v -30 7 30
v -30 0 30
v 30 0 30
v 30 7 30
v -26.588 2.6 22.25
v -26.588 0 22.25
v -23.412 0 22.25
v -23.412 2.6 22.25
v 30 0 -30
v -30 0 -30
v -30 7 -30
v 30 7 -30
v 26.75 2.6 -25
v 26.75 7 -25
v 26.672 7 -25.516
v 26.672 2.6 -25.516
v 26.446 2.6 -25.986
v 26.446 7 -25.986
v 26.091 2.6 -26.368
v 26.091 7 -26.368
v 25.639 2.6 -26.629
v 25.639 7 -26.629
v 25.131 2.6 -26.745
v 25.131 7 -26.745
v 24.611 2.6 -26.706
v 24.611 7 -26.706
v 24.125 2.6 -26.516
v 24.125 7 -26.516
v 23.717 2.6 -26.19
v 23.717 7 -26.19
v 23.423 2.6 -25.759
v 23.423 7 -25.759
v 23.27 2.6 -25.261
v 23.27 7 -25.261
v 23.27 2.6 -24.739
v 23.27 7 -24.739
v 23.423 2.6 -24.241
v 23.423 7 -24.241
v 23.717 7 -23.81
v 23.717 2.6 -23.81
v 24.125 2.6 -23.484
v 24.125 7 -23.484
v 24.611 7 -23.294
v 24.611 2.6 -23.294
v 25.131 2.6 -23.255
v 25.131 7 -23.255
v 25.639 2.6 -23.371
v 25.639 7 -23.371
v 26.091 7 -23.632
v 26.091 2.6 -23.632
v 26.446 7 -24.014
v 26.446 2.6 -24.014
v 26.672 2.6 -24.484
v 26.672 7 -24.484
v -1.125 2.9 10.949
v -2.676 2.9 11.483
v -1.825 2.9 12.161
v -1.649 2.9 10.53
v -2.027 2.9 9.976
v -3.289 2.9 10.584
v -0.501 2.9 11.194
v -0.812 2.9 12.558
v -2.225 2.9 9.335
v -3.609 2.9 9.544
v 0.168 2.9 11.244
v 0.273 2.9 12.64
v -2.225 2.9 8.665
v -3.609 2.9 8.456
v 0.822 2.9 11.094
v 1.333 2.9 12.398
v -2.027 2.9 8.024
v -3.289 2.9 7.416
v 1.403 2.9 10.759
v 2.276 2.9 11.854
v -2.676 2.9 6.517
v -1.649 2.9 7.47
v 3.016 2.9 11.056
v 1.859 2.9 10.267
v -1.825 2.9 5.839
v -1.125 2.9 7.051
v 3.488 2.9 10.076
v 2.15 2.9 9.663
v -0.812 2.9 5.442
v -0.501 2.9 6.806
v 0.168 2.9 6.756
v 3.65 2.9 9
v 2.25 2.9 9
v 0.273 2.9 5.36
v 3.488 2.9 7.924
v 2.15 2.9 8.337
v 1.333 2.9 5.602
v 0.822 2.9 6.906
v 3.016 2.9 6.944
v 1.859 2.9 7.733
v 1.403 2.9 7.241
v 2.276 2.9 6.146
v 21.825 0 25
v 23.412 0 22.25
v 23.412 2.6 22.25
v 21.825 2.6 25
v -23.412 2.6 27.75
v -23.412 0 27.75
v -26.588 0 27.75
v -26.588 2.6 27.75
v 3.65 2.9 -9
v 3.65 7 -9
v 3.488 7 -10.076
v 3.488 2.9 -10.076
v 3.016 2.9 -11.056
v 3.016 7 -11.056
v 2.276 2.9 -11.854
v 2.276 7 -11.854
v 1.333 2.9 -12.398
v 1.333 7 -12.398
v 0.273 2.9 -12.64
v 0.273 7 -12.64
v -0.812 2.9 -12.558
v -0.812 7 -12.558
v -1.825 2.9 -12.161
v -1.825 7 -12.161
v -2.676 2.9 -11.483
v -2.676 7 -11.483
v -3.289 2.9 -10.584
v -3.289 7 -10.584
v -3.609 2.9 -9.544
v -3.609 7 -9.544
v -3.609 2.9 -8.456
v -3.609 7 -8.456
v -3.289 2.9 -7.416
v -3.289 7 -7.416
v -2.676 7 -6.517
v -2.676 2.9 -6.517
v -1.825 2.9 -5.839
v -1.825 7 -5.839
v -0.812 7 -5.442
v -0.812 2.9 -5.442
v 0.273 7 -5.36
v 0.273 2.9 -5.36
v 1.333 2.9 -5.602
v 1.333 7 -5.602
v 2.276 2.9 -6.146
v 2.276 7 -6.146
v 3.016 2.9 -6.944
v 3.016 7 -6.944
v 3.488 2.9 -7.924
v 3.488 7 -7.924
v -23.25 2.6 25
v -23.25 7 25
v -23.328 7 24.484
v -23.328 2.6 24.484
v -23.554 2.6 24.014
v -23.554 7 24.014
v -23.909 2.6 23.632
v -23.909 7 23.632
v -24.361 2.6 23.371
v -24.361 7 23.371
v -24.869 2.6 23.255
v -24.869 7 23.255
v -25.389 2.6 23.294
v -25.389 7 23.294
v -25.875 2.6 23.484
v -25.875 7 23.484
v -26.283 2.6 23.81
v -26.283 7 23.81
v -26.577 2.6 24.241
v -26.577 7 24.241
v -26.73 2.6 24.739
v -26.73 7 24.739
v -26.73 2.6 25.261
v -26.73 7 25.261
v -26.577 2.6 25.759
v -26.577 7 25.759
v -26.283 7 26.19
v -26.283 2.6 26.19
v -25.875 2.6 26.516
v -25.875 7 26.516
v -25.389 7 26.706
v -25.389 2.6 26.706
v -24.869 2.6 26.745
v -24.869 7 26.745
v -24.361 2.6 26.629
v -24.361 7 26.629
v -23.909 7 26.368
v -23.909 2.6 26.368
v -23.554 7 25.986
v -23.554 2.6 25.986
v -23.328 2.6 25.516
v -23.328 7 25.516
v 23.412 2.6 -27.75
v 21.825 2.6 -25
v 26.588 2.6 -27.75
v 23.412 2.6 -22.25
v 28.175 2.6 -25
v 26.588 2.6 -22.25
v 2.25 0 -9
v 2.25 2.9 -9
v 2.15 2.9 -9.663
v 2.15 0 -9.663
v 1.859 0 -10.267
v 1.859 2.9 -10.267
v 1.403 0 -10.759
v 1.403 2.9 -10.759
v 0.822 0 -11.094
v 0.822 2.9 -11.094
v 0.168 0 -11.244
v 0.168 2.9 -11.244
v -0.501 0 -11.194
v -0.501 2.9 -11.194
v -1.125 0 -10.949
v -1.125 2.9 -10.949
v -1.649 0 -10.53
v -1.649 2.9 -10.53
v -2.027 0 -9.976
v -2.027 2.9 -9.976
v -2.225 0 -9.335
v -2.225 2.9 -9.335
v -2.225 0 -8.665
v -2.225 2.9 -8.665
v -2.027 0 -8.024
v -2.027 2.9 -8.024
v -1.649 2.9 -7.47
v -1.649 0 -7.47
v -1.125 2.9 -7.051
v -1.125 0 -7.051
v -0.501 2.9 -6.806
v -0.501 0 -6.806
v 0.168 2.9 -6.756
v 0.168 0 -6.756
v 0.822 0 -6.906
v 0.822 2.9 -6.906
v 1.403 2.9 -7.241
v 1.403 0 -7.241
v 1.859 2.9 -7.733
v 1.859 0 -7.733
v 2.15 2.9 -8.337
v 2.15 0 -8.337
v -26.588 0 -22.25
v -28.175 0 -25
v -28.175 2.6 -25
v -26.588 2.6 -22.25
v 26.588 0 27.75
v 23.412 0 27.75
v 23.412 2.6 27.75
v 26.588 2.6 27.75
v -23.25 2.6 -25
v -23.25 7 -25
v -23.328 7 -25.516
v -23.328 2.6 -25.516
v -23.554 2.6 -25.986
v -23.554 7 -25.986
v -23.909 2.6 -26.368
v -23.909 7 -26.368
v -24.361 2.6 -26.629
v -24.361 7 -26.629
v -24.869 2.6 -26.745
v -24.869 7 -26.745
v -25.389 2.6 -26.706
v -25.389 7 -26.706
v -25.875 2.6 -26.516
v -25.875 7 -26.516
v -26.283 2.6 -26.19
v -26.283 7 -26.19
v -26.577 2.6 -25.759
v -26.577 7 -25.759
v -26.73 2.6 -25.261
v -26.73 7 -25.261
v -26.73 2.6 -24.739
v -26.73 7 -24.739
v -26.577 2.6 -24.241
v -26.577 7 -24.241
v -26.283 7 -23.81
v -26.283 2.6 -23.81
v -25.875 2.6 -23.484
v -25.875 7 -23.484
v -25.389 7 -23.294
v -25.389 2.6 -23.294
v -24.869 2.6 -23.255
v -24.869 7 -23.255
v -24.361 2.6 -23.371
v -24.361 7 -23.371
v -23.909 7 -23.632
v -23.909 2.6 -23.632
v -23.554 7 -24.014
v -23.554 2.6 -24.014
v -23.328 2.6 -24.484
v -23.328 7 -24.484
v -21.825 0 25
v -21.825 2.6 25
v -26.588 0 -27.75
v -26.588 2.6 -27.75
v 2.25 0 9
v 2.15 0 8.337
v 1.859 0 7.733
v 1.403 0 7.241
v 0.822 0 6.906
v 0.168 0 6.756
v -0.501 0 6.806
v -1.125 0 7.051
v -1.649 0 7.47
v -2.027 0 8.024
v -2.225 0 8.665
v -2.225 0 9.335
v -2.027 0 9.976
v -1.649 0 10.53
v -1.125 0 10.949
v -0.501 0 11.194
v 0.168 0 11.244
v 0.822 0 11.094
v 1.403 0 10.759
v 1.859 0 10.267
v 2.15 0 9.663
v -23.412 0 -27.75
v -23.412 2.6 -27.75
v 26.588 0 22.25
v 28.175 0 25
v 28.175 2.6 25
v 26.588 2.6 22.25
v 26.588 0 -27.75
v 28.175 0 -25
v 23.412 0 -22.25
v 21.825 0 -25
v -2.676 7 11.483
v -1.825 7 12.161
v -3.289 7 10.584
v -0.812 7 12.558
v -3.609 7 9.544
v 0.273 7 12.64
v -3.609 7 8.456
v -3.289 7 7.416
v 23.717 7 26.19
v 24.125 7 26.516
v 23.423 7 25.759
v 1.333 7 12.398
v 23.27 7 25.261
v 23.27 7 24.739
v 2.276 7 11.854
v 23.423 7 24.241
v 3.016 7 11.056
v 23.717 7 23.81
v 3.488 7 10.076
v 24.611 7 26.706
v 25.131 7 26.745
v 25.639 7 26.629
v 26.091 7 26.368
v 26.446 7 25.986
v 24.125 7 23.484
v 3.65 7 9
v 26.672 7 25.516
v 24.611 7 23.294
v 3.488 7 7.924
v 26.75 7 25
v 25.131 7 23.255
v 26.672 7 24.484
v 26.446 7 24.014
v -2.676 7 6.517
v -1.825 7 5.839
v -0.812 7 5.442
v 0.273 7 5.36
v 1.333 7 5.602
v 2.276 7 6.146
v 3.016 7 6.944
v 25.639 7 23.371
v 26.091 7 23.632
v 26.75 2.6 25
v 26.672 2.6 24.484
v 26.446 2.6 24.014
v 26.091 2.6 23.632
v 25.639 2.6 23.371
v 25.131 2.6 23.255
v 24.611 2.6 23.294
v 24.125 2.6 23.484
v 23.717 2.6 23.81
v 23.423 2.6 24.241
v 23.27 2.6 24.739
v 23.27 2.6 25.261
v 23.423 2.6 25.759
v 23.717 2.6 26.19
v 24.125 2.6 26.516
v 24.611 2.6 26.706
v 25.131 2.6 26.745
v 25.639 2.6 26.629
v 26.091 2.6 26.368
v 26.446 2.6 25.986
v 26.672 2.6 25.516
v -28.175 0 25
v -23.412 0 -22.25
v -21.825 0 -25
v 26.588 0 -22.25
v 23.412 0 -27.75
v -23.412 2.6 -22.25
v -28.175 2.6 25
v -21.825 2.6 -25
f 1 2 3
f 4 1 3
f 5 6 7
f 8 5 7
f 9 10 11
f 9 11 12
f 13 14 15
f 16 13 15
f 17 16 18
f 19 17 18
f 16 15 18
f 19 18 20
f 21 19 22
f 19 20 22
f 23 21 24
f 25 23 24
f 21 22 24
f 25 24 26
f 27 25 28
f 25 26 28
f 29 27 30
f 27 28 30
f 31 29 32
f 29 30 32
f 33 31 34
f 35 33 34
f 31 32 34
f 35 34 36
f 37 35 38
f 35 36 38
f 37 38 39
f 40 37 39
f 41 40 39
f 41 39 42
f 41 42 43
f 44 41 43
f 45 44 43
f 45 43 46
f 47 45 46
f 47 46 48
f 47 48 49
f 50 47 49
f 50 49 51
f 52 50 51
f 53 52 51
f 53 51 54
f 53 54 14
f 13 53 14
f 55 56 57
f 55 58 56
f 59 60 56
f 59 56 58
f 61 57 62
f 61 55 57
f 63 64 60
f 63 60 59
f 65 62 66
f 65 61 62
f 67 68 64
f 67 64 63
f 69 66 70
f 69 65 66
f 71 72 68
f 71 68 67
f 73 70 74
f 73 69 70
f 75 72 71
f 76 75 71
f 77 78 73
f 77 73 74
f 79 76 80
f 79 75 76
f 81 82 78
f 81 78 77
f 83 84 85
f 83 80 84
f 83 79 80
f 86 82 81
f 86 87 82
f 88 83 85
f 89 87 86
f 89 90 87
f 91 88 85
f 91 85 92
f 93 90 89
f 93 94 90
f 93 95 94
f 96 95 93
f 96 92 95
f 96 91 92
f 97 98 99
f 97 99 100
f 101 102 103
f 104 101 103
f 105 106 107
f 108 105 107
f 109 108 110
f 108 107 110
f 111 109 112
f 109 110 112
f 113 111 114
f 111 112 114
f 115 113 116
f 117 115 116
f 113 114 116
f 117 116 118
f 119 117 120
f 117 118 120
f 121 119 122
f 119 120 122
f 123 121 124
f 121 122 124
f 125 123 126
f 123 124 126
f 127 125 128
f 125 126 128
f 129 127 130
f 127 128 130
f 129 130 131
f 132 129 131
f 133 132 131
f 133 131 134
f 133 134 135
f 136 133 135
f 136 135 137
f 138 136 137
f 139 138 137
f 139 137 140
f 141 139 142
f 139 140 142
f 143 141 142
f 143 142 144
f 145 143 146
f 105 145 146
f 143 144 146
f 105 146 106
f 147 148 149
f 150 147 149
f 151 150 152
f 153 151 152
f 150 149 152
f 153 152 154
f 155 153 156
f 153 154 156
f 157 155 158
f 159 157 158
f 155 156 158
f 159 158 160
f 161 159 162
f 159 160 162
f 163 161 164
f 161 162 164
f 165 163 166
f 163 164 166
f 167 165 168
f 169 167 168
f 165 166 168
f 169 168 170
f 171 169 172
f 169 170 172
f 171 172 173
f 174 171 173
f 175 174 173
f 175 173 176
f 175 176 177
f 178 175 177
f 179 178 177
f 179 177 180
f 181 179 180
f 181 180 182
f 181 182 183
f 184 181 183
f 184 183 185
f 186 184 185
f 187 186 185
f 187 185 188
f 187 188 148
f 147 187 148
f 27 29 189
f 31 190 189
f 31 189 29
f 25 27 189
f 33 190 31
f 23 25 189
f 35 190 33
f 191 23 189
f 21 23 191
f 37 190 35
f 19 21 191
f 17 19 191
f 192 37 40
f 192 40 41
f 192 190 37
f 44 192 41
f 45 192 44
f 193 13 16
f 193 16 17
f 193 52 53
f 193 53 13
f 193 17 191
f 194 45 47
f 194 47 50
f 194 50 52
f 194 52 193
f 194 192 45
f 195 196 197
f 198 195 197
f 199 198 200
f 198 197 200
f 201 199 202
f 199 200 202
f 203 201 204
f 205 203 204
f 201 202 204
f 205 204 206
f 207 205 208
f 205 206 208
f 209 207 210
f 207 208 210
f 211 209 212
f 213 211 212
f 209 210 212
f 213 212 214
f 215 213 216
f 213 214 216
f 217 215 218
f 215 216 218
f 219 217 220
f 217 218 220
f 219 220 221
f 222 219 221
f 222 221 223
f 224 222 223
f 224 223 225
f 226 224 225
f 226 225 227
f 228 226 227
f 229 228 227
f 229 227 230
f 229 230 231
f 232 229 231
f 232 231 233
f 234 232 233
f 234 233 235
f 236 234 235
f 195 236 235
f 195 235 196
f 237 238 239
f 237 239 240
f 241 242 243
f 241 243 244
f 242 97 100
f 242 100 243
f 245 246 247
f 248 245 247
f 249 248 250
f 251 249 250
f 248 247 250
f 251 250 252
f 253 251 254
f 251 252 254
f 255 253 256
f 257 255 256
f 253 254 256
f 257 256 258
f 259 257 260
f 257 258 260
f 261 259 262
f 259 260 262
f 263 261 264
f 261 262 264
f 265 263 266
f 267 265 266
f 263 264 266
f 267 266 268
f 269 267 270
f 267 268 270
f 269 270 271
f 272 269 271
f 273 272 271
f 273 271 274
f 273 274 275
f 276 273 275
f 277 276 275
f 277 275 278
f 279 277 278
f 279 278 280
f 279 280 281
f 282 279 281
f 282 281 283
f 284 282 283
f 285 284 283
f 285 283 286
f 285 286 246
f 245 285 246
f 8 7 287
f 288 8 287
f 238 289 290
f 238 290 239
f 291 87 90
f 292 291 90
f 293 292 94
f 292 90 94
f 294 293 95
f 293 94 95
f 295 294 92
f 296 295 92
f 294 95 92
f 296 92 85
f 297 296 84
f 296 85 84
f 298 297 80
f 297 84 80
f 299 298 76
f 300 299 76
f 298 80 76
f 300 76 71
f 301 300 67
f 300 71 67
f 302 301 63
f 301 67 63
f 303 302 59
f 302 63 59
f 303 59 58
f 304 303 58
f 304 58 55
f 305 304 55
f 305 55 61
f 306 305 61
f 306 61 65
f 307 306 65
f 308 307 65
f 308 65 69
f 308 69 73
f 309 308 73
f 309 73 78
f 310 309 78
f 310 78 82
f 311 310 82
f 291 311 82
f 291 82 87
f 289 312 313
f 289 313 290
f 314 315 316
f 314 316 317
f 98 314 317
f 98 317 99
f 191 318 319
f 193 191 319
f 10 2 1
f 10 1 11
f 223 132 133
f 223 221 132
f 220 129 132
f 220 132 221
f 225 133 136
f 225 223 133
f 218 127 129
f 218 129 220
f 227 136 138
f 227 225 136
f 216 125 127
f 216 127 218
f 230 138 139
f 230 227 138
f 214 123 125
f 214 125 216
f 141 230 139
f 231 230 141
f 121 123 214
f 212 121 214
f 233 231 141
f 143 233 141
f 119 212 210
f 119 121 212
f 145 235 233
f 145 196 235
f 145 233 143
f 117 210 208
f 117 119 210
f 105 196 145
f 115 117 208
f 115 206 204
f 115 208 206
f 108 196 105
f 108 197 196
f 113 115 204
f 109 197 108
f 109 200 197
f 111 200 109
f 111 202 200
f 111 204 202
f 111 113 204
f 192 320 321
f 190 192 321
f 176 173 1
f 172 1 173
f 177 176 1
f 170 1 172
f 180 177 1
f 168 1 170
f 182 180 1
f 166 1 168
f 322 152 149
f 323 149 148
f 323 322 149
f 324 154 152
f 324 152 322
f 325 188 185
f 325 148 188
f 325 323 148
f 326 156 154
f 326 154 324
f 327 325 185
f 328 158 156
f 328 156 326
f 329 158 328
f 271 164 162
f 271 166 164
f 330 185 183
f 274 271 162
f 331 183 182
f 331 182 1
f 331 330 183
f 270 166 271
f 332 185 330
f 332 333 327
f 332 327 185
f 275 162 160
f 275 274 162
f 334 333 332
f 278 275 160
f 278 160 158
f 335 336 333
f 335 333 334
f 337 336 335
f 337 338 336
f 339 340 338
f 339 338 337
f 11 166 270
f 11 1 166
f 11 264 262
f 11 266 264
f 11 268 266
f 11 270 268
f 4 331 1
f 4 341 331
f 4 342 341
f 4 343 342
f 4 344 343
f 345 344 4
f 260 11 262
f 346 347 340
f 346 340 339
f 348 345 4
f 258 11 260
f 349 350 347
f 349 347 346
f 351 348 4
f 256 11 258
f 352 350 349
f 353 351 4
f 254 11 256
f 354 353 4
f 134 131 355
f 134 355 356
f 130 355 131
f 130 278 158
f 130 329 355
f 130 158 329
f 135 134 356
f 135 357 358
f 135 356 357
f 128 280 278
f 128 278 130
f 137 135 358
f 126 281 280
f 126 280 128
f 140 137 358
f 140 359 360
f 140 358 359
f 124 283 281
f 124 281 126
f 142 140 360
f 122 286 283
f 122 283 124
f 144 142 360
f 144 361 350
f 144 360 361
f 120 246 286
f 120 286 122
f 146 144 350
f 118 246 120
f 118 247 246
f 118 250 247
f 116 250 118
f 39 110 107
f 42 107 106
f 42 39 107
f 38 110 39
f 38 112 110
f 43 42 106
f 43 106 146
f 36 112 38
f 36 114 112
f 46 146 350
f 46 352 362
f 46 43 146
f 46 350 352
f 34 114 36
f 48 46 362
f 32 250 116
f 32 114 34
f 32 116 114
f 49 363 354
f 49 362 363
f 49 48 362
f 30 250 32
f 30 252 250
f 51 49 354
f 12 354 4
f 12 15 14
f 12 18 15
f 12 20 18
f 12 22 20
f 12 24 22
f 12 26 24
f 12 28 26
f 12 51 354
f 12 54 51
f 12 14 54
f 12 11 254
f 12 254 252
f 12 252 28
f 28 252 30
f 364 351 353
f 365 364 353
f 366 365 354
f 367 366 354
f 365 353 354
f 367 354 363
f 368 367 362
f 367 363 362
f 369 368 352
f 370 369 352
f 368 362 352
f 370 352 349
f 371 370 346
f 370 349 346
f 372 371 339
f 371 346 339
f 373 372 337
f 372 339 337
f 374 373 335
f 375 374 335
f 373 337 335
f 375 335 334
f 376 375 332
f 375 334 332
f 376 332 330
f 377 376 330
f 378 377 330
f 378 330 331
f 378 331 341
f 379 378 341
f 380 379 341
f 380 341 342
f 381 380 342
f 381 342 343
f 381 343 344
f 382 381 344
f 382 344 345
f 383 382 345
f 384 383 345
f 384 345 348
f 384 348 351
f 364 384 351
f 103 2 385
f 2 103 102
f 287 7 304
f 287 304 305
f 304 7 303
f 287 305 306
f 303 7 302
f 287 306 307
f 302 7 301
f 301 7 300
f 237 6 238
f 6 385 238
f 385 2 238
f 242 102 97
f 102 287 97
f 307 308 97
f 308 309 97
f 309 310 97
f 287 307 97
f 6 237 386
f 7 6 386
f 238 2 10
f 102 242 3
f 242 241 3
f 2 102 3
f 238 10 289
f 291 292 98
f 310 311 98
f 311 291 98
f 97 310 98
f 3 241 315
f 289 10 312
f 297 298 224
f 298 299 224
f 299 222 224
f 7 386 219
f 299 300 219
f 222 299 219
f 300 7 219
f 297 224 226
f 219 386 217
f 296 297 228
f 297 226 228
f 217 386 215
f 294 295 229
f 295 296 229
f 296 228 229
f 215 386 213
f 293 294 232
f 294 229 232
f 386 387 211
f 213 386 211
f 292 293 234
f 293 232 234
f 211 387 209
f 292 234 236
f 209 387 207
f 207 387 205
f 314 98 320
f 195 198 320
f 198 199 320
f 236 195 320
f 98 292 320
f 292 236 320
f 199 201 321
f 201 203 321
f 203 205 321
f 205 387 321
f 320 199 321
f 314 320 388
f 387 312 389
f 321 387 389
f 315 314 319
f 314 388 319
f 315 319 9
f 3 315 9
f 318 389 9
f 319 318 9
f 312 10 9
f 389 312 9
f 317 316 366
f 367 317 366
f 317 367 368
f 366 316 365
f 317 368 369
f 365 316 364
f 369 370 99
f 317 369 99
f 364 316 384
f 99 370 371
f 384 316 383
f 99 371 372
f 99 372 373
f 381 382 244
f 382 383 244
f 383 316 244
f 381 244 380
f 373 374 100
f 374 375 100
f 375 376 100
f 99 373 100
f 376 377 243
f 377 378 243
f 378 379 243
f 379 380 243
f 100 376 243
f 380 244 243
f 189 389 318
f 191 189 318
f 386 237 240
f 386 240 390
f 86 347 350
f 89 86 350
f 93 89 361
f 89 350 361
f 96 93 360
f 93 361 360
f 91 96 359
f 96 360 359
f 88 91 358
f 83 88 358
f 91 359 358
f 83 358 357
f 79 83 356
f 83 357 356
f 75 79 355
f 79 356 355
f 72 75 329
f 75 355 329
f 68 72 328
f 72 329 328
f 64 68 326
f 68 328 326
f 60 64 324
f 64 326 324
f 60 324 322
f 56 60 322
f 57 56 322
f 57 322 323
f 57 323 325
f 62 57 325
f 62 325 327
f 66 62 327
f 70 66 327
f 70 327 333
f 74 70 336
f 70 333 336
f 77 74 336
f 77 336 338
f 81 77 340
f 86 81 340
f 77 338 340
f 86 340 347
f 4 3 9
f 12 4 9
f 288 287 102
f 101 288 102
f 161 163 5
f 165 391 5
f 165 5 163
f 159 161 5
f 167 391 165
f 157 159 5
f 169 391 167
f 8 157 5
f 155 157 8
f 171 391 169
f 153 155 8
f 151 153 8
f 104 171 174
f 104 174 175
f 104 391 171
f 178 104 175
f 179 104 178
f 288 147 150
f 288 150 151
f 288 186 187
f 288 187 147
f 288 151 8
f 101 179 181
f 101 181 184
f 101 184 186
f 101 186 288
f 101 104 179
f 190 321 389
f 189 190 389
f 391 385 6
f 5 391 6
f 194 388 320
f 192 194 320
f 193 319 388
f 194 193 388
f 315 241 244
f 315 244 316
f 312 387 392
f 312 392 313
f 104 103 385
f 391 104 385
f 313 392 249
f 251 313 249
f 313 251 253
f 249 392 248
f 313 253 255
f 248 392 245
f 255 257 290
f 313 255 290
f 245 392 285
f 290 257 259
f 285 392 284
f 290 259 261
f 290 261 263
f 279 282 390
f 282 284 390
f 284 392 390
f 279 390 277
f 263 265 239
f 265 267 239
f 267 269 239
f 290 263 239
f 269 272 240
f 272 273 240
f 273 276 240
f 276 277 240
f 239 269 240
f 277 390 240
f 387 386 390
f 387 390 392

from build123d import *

# Parameters (mm, degrees)
SKETCH_2_W          = 60
SKETCH_2_H          = 60
EXTRUDE_1_DEPTH     = 7
CUT_EXTRUDE_1_DEPTH = 2.6
CUT_EXTRUDE_2_REACH = 9
SKETCH_4_R          = 1.75
SKETCH_5_R          = 3.65
CUT_EXTRUDE_3_DEPTH = 4.1
CUT_EXTRUDE_4_REACH = 4.9
SKETCH_6_R          = 2.25


with BuildPart() as part:
    # 草圖2 → 填料-伸長1 (new body)
    with BuildSketch(Plane(origin=(0, 0, 0), x_dir=(1, 0, 0), z_dir=(0, 1, 0))):
        Rectangle(SKETCH_2_W, SKETCH_2_H)
    extrude(amount=EXTRUDE_1_DEPTH)

    # 草圖3 → 除料-伸長1 (cut)
    with BuildSketch(Plane.XZ):
        Polygon((-21.824573519, 25), (-23.41228676, 27.75), (-26.58771324, 27.75), (-28.175426481, 25), (-26.58771324, 22.25), (-23.41228676, 22.25), align=None)
        Polygon((23.41228676, 22.25), (21.824573519, 25), (23.41228676, 27.75), (26.58771324, 27.75), (28.175426481, 25), (26.58771324, 22.25), align=None)
        Polygon((21.824573519, -25), (23.41228676, -27.75), (26.58771324, -27.75), (28.175426481, -25), (26.58771324, -22.25), (23.41228676, -22.25), align=None)
        Polygon((-23.41228676, -22.25), (-21.824573519, -25), (-23.41228676, -27.75), (-26.58771324, -27.75), (-28.175426481, -25), (-26.58771324, -22.25), align=None)
    extrude(amount=-CUT_EXTRUDE_1_DEPTH, mode=Mode.SUBTRACT)

    # 草圖4 → 除料-伸長2 (cut, up to next)
    with BuildSketch(Plane(origin=(0, 7, 0), x_dir=(1, 0, 0), z_dir=(0, 1, 0)), mode=Mode.PRIVATE) as cut_extrude_2_sk1:
        with Locations((-25, 25)):
            Circle(SKETCH_4_R)
    cut_extrude_2_tool1 = extrude(cut_extrude_2_sk1.sketch, amount=-CUT_EXTRUDE_2_REACH, mode=Mode.PRIVATE) & part.part
    add(cut_extrude_2_tool1.solids().sort_by_distance((-25, 7, -25))[0], mode=Mode.SUBTRACT)
    # 草圖4 → 除料-伸長2 (cut, up to next)
    with BuildSketch(Plane(origin=(0, 7, 0), x_dir=(1, 0, 0), z_dir=(0, 1, 0)), mode=Mode.PRIVATE) as cut_extrude_2_sk2:
        with Locations((25, 25)):
            Circle(SKETCH_4_R)
    cut_extrude_2_tool2 = extrude(cut_extrude_2_sk2.sketch, amount=-CUT_EXTRUDE_2_REACH, mode=Mode.PRIVATE) & part.part
    add(cut_extrude_2_tool2.solids().sort_by_distance((25, 7, -25))[0], mode=Mode.SUBTRACT)
    # 草圖4 → 除料-伸長2 (cut, up to next)
    with BuildSketch(Plane(origin=(0, 7, 0), x_dir=(1, 0, 0), z_dir=(0, 1, 0)), mode=Mode.PRIVATE) as cut_extrude_2_sk3:
        with Locations((25, -25)):
            Circle(SKETCH_4_R)
    cut_extrude_2_tool3 = extrude(cut_extrude_2_sk3.sketch, amount=-CUT_EXTRUDE_2_REACH, mode=Mode.PRIVATE) & part.part
    add(cut_extrude_2_tool3.solids().sort_by_distance((25, 7, 25))[0], mode=Mode.SUBTRACT)
    # 草圖4 → 除料-伸長2 (cut, up to next)
    with BuildSketch(Plane(origin=(0, 7, 0), x_dir=(1, 0, 0), z_dir=(0, 1, 0)), mode=Mode.PRIVATE) as cut_extrude_2_sk4:
        with Locations((-25, -25)):
            Circle(SKETCH_4_R)
    cut_extrude_2_tool4 = extrude(cut_extrude_2_sk4.sketch, amount=-CUT_EXTRUDE_2_REACH, mode=Mode.PRIVATE) & part.part
    add(cut_extrude_2_tool4.solids().sort_by_distance((-25, 7, 25))[0], mode=Mode.SUBTRACT)

    # 草圖5 → 除料-伸長3 (cut)
    with BuildSketch(Plane(origin=(0, 7, 0), x_dir=(1, 0, 0), z_dir=(0, 1, 0))):
        with Locations((0, 9)):
            Circle(SKETCH_5_R)
        with Locations((0, -9)):
            Circle(SKETCH_5_R)
    extrude(amount=-CUT_EXTRUDE_3_DEPTH, mode=Mode.SUBTRACT)

    # 草圖6 → 除料-伸長4 (cut, up to next)
    with BuildSketch(Plane(origin=(0, 2.9, 0), x_dir=(1, 0, 0), z_dir=(0, 1, 0)), mode=Mode.PRIVATE) as cut_extrude_4_sk1:
        with Locations((0, 9)):
            Circle(SKETCH_6_R)
    cut_extrude_4_tool1 = extrude(cut_extrude_4_sk1.sketch, amount=-CUT_EXTRUDE_4_REACH, mode=Mode.PRIVATE) & part.part
    add(cut_extrude_4_tool1.solids().sort_by_distance((0, 2.9, -9))[0], mode=Mode.SUBTRACT)
    # 草圖6 → 除料-伸長4 (cut, up to next)
    with BuildSketch(Plane(origin=(0, 2.9, 0), x_dir=(1, 0, 0), z_dir=(0, 1, 0)), mode=Mode.PRIVATE) as cut_extrude_4_sk2:
        with Locations((0, -9)):
            Circle(SKETCH_6_R)
    cut_extrude_4_tool2 = extrude(cut_extrude_4_sk2.sketch, amount=-CUT_EXTRUDE_4_REACH, mode=Mode.PRIVATE) & part.part
    add(cut_extrude_4_tool2.solids().sort_by_distance((0, 2.9, 9))[0], mode=Mode.SUBTRACT)


solid = part.part
